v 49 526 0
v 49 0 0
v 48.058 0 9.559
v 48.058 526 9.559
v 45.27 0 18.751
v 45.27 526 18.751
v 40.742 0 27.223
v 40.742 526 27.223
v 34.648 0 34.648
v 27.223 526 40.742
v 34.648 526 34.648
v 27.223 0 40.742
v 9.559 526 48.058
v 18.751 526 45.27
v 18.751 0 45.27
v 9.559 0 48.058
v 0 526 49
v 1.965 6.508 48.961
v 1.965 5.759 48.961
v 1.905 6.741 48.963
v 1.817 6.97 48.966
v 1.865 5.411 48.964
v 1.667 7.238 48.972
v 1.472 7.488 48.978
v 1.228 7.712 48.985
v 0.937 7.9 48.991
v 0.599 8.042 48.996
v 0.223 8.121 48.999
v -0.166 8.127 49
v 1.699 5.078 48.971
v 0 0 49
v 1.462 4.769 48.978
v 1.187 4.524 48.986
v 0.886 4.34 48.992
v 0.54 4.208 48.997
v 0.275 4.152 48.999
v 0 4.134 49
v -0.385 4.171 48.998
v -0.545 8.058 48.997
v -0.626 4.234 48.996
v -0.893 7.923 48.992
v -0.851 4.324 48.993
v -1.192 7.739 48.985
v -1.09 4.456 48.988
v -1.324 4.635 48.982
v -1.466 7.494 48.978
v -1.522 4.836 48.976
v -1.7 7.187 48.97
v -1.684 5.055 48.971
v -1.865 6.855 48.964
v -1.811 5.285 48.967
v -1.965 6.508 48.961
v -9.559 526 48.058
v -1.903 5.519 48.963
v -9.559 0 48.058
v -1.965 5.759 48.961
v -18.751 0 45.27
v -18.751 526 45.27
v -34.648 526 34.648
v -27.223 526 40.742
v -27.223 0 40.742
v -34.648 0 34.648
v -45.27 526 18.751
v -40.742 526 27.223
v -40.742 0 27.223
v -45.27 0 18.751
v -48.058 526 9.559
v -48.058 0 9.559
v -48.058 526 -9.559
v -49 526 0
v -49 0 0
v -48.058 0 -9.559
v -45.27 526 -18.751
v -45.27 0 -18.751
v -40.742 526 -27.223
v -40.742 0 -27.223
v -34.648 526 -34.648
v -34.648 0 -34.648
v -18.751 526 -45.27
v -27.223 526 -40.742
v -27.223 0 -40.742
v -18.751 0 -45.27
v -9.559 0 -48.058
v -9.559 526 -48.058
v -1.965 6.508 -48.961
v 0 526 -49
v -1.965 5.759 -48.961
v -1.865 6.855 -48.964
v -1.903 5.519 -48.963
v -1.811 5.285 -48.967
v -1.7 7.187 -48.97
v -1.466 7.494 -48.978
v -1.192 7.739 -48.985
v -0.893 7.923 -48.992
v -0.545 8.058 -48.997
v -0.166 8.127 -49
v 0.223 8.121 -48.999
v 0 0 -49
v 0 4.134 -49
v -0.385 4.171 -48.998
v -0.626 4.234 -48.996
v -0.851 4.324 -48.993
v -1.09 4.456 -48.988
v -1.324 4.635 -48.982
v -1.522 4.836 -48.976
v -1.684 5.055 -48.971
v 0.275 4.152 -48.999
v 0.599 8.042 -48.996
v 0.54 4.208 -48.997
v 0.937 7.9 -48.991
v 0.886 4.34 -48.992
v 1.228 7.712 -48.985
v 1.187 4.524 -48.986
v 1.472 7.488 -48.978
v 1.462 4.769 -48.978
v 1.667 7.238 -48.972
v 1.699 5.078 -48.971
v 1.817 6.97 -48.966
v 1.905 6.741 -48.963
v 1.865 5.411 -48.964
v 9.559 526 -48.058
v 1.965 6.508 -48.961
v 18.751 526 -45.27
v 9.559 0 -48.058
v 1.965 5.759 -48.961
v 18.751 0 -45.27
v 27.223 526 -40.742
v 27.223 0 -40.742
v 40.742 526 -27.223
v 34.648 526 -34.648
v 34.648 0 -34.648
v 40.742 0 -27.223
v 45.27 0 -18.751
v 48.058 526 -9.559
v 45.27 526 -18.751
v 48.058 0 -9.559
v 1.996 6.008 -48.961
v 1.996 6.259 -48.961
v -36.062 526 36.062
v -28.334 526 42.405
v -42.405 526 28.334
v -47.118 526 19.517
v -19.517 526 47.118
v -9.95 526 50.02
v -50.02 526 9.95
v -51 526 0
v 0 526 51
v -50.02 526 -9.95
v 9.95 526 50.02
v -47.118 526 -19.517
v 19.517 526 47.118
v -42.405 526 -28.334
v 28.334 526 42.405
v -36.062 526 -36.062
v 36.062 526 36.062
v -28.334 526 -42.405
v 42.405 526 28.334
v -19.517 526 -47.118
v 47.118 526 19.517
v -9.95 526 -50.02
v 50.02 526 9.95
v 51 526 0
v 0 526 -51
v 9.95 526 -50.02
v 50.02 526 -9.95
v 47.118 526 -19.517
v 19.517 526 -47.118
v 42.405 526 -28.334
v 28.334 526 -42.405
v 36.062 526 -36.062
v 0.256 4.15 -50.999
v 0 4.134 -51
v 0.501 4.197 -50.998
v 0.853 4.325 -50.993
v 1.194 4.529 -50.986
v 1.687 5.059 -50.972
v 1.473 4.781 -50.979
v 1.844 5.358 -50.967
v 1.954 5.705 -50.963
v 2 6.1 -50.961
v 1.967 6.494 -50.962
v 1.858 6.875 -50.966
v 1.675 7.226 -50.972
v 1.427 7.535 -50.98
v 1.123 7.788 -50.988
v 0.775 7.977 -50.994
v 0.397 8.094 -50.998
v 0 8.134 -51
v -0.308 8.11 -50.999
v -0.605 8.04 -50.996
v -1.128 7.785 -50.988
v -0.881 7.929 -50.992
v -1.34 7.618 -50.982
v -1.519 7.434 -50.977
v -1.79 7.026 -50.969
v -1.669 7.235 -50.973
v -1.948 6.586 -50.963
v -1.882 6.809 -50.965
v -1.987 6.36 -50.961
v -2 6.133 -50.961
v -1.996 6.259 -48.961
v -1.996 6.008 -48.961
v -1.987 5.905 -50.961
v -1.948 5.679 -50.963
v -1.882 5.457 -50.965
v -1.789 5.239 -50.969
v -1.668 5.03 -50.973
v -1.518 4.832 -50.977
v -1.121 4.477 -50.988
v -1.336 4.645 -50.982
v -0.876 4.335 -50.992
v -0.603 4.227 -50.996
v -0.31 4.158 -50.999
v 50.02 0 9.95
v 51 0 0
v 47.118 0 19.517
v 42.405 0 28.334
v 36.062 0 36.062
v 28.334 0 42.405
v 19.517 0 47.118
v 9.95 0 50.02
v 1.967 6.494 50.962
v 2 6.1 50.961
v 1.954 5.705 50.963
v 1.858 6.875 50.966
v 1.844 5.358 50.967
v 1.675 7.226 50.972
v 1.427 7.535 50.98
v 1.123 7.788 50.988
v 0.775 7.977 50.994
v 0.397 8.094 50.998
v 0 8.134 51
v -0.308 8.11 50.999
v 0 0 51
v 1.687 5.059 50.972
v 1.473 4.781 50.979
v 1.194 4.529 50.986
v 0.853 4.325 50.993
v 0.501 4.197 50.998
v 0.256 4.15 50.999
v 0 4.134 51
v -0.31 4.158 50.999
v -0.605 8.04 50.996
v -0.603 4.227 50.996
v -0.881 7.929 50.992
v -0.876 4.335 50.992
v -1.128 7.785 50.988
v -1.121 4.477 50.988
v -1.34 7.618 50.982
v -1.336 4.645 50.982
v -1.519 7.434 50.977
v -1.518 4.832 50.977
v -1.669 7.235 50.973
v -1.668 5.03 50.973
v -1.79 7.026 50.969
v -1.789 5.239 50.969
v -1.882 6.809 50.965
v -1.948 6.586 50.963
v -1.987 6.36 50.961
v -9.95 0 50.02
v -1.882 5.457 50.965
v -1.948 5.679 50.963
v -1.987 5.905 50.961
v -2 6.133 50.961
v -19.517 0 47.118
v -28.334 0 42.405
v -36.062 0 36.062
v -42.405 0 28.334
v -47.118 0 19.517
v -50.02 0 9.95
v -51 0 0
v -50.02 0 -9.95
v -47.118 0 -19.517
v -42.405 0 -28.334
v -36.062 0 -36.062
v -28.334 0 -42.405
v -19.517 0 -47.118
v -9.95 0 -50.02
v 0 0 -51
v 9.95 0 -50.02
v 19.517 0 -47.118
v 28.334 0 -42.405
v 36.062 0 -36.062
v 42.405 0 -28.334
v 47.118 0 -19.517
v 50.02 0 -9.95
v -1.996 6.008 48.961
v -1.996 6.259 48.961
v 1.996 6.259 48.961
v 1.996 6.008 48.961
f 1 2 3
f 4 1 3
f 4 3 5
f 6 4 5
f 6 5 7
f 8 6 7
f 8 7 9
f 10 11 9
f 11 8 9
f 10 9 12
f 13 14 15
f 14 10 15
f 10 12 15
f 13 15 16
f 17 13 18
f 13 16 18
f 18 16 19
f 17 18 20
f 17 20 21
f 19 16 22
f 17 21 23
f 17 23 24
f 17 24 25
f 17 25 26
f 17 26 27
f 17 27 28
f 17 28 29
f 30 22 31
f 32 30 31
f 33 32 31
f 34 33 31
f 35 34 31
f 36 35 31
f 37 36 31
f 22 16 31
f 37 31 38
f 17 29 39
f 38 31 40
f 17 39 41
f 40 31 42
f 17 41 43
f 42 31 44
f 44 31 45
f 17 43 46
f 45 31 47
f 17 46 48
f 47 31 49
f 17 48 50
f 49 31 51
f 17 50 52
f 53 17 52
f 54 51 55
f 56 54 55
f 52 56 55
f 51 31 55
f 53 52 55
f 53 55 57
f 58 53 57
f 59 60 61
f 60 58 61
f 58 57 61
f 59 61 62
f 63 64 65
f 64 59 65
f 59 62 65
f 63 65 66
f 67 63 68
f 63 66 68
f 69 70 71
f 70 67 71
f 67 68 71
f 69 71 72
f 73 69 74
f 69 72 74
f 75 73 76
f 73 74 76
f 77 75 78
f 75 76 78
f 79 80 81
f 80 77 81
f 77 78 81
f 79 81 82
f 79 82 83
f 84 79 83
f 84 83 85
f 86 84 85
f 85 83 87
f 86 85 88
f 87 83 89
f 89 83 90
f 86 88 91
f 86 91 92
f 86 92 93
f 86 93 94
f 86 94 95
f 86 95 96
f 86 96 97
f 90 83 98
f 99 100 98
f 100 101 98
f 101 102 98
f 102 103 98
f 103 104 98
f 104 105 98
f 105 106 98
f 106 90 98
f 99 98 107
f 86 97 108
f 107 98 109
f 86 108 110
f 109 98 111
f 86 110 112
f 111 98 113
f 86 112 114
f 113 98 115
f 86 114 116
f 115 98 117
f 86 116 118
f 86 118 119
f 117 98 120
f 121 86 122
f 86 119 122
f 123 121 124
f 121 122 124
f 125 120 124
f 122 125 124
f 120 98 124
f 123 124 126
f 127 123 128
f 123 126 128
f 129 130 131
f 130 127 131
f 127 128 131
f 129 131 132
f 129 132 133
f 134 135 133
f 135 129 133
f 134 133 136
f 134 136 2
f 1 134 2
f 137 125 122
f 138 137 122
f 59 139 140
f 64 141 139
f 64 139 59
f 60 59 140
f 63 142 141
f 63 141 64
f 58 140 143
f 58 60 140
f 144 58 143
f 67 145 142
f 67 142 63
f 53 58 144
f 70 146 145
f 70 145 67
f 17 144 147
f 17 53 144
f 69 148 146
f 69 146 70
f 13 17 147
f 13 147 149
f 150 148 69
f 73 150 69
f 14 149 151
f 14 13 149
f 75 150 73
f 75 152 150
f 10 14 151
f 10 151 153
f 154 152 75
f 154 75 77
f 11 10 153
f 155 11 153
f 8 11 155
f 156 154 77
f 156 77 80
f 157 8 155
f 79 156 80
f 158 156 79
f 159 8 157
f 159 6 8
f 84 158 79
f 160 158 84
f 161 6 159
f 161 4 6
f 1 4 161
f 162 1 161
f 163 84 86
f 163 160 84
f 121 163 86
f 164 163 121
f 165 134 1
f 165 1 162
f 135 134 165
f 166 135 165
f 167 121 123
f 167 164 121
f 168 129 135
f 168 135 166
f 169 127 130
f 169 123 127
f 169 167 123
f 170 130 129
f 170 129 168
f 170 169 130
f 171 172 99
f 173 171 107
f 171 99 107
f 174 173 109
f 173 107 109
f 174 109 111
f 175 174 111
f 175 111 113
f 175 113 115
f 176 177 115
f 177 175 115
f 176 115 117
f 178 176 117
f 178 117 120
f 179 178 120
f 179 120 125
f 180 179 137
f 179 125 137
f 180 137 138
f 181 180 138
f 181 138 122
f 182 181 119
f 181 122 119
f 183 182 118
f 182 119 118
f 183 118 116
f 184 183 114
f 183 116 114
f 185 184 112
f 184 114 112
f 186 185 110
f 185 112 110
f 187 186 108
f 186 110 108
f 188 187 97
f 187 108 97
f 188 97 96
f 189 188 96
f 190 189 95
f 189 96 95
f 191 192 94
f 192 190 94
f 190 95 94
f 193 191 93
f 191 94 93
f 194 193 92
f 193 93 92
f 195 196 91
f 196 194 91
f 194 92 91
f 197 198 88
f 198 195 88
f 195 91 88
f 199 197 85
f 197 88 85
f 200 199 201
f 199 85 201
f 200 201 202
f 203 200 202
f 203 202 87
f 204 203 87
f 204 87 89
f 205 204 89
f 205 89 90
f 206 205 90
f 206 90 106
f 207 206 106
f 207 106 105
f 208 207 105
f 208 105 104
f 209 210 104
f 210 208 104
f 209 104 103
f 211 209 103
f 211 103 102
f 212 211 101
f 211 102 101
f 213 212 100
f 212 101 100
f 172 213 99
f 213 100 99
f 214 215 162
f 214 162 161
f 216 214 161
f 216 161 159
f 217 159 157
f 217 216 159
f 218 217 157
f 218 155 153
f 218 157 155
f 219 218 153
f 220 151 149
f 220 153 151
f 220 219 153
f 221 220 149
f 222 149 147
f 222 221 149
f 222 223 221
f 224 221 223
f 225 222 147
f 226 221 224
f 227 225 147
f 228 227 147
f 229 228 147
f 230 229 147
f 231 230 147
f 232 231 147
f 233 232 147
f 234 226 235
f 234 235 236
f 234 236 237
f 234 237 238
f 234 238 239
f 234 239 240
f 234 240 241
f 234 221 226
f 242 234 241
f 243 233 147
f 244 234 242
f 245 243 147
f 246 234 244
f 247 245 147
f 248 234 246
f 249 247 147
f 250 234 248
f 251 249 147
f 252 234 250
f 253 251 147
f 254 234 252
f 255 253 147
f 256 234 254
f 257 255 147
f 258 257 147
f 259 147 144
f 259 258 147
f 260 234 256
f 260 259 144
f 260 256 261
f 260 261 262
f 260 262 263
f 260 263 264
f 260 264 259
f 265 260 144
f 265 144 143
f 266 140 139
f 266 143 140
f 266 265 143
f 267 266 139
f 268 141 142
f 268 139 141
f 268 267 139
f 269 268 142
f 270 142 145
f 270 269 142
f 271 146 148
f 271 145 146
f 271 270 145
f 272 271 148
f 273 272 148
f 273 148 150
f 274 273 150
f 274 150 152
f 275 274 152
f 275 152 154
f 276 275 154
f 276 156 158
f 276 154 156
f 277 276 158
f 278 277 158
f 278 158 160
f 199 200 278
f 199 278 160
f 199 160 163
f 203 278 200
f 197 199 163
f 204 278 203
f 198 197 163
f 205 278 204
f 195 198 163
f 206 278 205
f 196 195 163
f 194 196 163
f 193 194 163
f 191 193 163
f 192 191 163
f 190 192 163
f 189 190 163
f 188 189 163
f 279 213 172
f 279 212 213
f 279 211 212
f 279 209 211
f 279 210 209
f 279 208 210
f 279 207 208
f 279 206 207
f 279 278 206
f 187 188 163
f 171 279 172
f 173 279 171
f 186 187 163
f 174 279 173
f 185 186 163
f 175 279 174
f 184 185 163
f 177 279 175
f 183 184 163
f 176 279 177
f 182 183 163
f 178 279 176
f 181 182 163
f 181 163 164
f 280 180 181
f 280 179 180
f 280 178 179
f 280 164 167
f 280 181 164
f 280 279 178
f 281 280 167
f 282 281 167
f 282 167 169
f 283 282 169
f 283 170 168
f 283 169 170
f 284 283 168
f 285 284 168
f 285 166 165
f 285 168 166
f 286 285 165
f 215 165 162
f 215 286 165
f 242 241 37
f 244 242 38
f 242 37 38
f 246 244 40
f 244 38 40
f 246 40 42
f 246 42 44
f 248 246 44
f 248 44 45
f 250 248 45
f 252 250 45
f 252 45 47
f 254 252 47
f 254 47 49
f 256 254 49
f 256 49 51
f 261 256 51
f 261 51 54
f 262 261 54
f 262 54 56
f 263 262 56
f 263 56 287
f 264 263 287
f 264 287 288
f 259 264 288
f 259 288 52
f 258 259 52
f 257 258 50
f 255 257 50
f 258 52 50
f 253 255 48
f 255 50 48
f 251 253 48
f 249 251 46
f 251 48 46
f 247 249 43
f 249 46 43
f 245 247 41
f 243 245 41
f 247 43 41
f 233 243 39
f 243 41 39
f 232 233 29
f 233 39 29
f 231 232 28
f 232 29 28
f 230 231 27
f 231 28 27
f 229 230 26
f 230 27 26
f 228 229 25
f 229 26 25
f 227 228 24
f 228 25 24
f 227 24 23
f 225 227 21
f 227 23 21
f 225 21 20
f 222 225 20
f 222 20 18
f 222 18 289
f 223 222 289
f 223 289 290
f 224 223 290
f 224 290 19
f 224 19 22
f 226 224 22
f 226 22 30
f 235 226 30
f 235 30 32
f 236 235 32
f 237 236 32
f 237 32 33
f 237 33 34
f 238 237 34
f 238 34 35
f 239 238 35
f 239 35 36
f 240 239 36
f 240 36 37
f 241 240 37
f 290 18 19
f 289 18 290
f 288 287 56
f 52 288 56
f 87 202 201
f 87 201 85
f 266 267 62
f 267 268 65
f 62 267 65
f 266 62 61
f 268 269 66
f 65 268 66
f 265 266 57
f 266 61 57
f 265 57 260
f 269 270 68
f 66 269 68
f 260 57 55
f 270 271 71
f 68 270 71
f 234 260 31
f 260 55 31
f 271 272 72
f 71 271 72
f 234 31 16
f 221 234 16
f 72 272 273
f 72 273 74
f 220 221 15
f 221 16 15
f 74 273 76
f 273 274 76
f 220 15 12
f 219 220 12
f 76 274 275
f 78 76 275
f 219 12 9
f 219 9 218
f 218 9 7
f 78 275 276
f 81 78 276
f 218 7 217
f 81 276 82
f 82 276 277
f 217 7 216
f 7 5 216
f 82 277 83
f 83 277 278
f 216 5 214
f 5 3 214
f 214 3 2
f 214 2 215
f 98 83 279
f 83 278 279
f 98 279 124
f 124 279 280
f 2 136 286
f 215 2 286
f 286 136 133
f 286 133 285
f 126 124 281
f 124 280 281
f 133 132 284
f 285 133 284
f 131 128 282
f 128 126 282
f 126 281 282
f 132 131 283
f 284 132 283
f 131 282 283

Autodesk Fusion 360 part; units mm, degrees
sketch "Sketch1" plane through (0, 0, 0) normal (0, 1, 0) x (1, 0, 0)
  circle A0 centre (0, 0) radius 49
  circle A1 centre (0, 0) radius 51
  dimension "d1" = 98
  dimension "d4" = 102
extrude "Extrude2" add sketch "Sketch1" along normal blind 526
hole "Hole1" at (0, 6.1335, 51) direction (0, 0, -1) diameter 4 depth 2.0394 tip angle 180
mirror "Mirror1" about plane through (0, 0, 0) normal (0, 0, 1) of "Hole1"
